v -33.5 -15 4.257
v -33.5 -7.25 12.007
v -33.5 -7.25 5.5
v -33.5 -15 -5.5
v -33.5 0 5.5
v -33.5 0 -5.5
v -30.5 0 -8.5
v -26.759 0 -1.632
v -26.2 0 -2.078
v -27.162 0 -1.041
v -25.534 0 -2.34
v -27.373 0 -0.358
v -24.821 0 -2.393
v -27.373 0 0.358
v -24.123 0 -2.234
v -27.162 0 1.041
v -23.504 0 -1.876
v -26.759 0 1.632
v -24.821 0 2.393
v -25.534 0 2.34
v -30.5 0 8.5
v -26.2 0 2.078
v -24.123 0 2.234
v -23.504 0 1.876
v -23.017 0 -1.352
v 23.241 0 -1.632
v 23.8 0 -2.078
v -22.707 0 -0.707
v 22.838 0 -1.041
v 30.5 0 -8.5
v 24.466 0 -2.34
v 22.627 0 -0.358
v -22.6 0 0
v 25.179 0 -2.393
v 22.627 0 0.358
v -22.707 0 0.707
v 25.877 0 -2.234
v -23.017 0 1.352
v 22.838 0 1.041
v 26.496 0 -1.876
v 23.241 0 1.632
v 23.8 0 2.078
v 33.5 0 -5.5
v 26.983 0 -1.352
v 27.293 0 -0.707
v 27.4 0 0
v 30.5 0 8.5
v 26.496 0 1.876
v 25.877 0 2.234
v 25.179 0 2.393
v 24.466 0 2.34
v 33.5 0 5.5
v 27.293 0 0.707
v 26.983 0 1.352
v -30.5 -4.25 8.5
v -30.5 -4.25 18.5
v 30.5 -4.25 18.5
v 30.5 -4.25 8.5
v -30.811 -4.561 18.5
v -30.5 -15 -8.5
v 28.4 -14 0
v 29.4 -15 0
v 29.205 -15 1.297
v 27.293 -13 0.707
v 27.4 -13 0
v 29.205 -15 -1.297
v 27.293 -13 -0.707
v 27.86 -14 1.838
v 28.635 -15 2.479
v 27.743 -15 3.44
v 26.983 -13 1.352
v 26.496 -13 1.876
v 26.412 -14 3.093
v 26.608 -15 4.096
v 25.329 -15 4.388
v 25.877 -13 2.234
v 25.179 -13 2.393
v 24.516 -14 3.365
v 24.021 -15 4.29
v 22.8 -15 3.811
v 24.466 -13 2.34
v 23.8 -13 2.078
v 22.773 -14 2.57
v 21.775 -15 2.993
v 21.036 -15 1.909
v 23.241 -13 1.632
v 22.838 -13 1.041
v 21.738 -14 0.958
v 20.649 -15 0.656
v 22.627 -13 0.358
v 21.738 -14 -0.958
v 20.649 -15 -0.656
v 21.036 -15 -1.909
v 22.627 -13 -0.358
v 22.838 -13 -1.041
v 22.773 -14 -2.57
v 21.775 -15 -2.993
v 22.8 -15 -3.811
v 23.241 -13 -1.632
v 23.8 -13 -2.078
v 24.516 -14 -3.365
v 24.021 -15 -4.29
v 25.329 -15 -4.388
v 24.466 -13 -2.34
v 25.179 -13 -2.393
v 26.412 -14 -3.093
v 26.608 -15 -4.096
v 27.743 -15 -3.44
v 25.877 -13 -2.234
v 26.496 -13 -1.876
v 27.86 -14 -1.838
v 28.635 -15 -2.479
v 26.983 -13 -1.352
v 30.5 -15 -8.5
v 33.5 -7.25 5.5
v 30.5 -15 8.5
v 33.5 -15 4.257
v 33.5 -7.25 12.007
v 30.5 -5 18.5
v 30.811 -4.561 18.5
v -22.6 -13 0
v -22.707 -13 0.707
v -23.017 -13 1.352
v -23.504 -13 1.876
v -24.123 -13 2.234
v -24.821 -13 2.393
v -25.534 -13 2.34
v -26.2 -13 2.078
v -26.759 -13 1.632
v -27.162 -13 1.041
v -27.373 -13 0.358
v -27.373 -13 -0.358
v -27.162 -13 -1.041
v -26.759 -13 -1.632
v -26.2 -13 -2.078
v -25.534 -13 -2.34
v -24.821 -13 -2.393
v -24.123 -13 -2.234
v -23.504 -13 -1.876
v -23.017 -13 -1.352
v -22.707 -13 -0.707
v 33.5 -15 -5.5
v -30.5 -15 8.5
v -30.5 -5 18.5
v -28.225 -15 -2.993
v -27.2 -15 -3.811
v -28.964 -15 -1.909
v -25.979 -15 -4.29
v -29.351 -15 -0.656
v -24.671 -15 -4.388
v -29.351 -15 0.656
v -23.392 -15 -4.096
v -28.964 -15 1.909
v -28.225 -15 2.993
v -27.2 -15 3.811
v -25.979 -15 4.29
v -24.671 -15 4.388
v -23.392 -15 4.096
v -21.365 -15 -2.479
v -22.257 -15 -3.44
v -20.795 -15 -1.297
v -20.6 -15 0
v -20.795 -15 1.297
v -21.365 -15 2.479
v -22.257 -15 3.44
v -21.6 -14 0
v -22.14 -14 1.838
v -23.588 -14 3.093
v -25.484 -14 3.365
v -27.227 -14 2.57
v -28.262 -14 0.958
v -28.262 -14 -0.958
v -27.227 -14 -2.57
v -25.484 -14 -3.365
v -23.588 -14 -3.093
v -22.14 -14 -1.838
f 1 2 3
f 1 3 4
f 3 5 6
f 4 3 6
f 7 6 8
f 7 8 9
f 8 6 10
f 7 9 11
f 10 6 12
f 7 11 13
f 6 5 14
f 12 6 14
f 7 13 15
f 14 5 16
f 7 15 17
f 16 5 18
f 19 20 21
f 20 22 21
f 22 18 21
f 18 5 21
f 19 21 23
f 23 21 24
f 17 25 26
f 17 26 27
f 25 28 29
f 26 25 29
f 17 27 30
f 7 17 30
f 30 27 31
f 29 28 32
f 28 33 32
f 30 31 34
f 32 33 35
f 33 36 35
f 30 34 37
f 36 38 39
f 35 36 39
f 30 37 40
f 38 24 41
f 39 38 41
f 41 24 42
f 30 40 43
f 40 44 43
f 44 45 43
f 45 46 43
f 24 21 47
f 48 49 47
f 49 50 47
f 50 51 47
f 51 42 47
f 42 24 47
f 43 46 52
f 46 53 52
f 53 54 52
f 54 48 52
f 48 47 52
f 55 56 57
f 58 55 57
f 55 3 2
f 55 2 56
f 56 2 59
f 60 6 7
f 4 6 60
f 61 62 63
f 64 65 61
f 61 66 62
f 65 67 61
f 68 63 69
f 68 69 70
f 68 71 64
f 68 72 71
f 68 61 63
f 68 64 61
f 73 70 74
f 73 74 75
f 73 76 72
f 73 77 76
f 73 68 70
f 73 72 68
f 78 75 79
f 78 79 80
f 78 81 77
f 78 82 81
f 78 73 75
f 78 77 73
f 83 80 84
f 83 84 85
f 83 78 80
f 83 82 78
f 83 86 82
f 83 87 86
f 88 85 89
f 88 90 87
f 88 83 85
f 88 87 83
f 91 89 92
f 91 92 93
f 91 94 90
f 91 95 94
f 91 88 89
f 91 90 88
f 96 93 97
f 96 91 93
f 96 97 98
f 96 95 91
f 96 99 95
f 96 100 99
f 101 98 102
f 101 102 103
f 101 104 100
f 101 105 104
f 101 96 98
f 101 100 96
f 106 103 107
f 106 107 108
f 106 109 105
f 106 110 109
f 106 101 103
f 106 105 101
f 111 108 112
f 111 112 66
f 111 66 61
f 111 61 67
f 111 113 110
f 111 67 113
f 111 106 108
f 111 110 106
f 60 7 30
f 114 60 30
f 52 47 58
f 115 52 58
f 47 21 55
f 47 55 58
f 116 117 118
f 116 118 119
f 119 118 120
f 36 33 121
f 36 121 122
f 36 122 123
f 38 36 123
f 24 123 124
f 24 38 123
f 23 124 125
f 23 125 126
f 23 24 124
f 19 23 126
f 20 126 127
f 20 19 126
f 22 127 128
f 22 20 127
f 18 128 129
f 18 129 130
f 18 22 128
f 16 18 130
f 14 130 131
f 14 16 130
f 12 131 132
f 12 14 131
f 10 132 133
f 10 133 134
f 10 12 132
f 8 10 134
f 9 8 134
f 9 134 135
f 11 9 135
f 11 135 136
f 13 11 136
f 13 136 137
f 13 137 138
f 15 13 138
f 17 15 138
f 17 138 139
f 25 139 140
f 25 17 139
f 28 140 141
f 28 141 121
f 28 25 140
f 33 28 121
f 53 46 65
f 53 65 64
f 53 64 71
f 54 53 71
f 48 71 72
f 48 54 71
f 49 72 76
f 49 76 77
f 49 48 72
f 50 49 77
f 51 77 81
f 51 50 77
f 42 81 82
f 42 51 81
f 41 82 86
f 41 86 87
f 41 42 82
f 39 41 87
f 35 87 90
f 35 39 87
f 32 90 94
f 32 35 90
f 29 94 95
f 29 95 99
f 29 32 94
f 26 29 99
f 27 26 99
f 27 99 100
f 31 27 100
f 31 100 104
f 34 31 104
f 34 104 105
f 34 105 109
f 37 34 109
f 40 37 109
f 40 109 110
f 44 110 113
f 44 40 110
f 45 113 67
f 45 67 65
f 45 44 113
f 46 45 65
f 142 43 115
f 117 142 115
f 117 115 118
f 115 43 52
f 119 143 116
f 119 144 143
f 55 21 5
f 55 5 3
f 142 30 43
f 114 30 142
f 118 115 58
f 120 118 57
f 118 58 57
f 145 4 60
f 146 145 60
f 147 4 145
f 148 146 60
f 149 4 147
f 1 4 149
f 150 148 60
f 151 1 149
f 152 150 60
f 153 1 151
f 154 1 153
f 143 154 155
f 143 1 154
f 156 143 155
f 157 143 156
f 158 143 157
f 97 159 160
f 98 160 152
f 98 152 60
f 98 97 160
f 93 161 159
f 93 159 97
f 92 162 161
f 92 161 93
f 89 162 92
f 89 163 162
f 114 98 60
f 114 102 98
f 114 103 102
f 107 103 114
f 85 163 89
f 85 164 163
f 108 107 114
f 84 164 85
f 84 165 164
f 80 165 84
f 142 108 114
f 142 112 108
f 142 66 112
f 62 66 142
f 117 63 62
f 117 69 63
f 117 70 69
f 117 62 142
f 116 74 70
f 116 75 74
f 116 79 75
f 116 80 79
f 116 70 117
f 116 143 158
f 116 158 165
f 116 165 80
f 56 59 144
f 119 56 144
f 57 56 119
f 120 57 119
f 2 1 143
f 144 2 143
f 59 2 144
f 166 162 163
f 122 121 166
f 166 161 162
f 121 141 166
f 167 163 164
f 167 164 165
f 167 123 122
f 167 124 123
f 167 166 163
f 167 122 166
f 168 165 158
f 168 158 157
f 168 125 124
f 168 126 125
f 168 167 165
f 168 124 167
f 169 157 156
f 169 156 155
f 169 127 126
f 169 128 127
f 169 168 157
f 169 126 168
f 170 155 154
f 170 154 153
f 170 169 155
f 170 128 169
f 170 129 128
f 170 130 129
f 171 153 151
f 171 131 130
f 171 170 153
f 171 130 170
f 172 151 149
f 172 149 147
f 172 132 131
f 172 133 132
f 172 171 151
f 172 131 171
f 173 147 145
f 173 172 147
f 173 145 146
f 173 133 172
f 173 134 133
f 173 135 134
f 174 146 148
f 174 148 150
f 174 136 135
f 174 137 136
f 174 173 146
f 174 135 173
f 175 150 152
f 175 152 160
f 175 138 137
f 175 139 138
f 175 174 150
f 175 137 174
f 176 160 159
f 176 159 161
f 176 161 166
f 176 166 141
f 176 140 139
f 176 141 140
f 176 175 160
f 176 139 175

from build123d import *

# Parameters (mm, degrees)
F0_W     = 67
F0_H     = 17
F0_R     = 2.4
F0_H_2   = 10
F1_DEPTH = 15
F2_DEPTH = 4.25
F3_SIZE  = 2
F4_SIZE  = 10
F5_SIZE  = 3


with BuildPart() as f1:
    # F0 (on Front) → F1 (new body)
    with BuildSketch(Plane.XZ):
        Rectangle(F0_W, F0_H)
        with Locations((-25, 0)):
            Circle(F0_R, mode=Mode.SUBTRACT)
        with Locations((25, 0)):
            Circle(F0_R, mode=Mode.SUBTRACT)
        with Locations((0, 13.5)):
            Rectangle(F0_W, F0_H_2)
    extrude(amount=F1_DEPTH)

    # F0 (on Front) → F2 (cut)
    with BuildSketch(Plane.XZ):
        with Locations((0, 13.5)):
            Rectangle(F0_W, F0_H_2)
    extrude(amount=F2_DEPTH, mode=Mode.SUBTRACT)

    # F3
    f3_edges = [f1.edges().sort_by_distance(p)[0] for p in [
        (-27.4, -15, 0),
        (22.6, -15, 0),
    ]]
    chamfer(f3_edges, length=F3_SIZE)

    # F4
    f4_edges = [f1.edges().sort_by_distance(p)[0] for p in [
        (0, -15, 18.5),
    ]]
    chamfer(f4_edges, length=F4_SIZE)

    # F5 (call 1 of 6: OpenCascade refuses the feature's edges together)
    f5_edges = [f1.edges().sort_by_distance(p)[0] for p in [
        (-33.5, -10, 13.5),
    ]]
    chamfer(f5_edges, length=F5_SIZE)

    # F5#2 (call 2 of 6)
    f5_2_edges = [f1.edges().sort_by_distance(p)[0] for p in [
        (33.5, -10, 13.5),
    ]]
    chamfer(f5_2_edges, length=F5_SIZE)

    # F5#3 (call 3 of 6)
    f5_3_edges = [f1.edges().sort_by_distance(p)[0] for p in [
        (33.5, -7.5, -8.5),
    ]]
    chamfer(f5_3_edges, length=F5_SIZE)

    # F5#4 (call 4 of 6)
    f5_4_edges = [f1.edges().sort_by_distance(p)[0] for p in [
        (-33.5, -7.5, -8.5),
    ]]
    chamfer(f5_4_edges, length=F5_SIZE)

    # F5#5 (call 5 of 6)
    f5_5_edges = [f1.edges().sort_by_distance(p)[0] for p in [
        (33.5, -2.125, 8.5),
        (33.5, -4.25, 13.5),
    ]]
    chamfer(f5_5_edges, length=F5_SIZE)

    # F5#6 (call 6 of 6)
    f5_6_edges = [f1.edges().sort_by_distance(p)[0] for p in [
        (-33.5, -4.25, 13.5),
        (-33.5, -2.125, 8.5),
    ]]
    chamfer(f5_6_edges, length=F5_SIZE)


solid = f1.part
